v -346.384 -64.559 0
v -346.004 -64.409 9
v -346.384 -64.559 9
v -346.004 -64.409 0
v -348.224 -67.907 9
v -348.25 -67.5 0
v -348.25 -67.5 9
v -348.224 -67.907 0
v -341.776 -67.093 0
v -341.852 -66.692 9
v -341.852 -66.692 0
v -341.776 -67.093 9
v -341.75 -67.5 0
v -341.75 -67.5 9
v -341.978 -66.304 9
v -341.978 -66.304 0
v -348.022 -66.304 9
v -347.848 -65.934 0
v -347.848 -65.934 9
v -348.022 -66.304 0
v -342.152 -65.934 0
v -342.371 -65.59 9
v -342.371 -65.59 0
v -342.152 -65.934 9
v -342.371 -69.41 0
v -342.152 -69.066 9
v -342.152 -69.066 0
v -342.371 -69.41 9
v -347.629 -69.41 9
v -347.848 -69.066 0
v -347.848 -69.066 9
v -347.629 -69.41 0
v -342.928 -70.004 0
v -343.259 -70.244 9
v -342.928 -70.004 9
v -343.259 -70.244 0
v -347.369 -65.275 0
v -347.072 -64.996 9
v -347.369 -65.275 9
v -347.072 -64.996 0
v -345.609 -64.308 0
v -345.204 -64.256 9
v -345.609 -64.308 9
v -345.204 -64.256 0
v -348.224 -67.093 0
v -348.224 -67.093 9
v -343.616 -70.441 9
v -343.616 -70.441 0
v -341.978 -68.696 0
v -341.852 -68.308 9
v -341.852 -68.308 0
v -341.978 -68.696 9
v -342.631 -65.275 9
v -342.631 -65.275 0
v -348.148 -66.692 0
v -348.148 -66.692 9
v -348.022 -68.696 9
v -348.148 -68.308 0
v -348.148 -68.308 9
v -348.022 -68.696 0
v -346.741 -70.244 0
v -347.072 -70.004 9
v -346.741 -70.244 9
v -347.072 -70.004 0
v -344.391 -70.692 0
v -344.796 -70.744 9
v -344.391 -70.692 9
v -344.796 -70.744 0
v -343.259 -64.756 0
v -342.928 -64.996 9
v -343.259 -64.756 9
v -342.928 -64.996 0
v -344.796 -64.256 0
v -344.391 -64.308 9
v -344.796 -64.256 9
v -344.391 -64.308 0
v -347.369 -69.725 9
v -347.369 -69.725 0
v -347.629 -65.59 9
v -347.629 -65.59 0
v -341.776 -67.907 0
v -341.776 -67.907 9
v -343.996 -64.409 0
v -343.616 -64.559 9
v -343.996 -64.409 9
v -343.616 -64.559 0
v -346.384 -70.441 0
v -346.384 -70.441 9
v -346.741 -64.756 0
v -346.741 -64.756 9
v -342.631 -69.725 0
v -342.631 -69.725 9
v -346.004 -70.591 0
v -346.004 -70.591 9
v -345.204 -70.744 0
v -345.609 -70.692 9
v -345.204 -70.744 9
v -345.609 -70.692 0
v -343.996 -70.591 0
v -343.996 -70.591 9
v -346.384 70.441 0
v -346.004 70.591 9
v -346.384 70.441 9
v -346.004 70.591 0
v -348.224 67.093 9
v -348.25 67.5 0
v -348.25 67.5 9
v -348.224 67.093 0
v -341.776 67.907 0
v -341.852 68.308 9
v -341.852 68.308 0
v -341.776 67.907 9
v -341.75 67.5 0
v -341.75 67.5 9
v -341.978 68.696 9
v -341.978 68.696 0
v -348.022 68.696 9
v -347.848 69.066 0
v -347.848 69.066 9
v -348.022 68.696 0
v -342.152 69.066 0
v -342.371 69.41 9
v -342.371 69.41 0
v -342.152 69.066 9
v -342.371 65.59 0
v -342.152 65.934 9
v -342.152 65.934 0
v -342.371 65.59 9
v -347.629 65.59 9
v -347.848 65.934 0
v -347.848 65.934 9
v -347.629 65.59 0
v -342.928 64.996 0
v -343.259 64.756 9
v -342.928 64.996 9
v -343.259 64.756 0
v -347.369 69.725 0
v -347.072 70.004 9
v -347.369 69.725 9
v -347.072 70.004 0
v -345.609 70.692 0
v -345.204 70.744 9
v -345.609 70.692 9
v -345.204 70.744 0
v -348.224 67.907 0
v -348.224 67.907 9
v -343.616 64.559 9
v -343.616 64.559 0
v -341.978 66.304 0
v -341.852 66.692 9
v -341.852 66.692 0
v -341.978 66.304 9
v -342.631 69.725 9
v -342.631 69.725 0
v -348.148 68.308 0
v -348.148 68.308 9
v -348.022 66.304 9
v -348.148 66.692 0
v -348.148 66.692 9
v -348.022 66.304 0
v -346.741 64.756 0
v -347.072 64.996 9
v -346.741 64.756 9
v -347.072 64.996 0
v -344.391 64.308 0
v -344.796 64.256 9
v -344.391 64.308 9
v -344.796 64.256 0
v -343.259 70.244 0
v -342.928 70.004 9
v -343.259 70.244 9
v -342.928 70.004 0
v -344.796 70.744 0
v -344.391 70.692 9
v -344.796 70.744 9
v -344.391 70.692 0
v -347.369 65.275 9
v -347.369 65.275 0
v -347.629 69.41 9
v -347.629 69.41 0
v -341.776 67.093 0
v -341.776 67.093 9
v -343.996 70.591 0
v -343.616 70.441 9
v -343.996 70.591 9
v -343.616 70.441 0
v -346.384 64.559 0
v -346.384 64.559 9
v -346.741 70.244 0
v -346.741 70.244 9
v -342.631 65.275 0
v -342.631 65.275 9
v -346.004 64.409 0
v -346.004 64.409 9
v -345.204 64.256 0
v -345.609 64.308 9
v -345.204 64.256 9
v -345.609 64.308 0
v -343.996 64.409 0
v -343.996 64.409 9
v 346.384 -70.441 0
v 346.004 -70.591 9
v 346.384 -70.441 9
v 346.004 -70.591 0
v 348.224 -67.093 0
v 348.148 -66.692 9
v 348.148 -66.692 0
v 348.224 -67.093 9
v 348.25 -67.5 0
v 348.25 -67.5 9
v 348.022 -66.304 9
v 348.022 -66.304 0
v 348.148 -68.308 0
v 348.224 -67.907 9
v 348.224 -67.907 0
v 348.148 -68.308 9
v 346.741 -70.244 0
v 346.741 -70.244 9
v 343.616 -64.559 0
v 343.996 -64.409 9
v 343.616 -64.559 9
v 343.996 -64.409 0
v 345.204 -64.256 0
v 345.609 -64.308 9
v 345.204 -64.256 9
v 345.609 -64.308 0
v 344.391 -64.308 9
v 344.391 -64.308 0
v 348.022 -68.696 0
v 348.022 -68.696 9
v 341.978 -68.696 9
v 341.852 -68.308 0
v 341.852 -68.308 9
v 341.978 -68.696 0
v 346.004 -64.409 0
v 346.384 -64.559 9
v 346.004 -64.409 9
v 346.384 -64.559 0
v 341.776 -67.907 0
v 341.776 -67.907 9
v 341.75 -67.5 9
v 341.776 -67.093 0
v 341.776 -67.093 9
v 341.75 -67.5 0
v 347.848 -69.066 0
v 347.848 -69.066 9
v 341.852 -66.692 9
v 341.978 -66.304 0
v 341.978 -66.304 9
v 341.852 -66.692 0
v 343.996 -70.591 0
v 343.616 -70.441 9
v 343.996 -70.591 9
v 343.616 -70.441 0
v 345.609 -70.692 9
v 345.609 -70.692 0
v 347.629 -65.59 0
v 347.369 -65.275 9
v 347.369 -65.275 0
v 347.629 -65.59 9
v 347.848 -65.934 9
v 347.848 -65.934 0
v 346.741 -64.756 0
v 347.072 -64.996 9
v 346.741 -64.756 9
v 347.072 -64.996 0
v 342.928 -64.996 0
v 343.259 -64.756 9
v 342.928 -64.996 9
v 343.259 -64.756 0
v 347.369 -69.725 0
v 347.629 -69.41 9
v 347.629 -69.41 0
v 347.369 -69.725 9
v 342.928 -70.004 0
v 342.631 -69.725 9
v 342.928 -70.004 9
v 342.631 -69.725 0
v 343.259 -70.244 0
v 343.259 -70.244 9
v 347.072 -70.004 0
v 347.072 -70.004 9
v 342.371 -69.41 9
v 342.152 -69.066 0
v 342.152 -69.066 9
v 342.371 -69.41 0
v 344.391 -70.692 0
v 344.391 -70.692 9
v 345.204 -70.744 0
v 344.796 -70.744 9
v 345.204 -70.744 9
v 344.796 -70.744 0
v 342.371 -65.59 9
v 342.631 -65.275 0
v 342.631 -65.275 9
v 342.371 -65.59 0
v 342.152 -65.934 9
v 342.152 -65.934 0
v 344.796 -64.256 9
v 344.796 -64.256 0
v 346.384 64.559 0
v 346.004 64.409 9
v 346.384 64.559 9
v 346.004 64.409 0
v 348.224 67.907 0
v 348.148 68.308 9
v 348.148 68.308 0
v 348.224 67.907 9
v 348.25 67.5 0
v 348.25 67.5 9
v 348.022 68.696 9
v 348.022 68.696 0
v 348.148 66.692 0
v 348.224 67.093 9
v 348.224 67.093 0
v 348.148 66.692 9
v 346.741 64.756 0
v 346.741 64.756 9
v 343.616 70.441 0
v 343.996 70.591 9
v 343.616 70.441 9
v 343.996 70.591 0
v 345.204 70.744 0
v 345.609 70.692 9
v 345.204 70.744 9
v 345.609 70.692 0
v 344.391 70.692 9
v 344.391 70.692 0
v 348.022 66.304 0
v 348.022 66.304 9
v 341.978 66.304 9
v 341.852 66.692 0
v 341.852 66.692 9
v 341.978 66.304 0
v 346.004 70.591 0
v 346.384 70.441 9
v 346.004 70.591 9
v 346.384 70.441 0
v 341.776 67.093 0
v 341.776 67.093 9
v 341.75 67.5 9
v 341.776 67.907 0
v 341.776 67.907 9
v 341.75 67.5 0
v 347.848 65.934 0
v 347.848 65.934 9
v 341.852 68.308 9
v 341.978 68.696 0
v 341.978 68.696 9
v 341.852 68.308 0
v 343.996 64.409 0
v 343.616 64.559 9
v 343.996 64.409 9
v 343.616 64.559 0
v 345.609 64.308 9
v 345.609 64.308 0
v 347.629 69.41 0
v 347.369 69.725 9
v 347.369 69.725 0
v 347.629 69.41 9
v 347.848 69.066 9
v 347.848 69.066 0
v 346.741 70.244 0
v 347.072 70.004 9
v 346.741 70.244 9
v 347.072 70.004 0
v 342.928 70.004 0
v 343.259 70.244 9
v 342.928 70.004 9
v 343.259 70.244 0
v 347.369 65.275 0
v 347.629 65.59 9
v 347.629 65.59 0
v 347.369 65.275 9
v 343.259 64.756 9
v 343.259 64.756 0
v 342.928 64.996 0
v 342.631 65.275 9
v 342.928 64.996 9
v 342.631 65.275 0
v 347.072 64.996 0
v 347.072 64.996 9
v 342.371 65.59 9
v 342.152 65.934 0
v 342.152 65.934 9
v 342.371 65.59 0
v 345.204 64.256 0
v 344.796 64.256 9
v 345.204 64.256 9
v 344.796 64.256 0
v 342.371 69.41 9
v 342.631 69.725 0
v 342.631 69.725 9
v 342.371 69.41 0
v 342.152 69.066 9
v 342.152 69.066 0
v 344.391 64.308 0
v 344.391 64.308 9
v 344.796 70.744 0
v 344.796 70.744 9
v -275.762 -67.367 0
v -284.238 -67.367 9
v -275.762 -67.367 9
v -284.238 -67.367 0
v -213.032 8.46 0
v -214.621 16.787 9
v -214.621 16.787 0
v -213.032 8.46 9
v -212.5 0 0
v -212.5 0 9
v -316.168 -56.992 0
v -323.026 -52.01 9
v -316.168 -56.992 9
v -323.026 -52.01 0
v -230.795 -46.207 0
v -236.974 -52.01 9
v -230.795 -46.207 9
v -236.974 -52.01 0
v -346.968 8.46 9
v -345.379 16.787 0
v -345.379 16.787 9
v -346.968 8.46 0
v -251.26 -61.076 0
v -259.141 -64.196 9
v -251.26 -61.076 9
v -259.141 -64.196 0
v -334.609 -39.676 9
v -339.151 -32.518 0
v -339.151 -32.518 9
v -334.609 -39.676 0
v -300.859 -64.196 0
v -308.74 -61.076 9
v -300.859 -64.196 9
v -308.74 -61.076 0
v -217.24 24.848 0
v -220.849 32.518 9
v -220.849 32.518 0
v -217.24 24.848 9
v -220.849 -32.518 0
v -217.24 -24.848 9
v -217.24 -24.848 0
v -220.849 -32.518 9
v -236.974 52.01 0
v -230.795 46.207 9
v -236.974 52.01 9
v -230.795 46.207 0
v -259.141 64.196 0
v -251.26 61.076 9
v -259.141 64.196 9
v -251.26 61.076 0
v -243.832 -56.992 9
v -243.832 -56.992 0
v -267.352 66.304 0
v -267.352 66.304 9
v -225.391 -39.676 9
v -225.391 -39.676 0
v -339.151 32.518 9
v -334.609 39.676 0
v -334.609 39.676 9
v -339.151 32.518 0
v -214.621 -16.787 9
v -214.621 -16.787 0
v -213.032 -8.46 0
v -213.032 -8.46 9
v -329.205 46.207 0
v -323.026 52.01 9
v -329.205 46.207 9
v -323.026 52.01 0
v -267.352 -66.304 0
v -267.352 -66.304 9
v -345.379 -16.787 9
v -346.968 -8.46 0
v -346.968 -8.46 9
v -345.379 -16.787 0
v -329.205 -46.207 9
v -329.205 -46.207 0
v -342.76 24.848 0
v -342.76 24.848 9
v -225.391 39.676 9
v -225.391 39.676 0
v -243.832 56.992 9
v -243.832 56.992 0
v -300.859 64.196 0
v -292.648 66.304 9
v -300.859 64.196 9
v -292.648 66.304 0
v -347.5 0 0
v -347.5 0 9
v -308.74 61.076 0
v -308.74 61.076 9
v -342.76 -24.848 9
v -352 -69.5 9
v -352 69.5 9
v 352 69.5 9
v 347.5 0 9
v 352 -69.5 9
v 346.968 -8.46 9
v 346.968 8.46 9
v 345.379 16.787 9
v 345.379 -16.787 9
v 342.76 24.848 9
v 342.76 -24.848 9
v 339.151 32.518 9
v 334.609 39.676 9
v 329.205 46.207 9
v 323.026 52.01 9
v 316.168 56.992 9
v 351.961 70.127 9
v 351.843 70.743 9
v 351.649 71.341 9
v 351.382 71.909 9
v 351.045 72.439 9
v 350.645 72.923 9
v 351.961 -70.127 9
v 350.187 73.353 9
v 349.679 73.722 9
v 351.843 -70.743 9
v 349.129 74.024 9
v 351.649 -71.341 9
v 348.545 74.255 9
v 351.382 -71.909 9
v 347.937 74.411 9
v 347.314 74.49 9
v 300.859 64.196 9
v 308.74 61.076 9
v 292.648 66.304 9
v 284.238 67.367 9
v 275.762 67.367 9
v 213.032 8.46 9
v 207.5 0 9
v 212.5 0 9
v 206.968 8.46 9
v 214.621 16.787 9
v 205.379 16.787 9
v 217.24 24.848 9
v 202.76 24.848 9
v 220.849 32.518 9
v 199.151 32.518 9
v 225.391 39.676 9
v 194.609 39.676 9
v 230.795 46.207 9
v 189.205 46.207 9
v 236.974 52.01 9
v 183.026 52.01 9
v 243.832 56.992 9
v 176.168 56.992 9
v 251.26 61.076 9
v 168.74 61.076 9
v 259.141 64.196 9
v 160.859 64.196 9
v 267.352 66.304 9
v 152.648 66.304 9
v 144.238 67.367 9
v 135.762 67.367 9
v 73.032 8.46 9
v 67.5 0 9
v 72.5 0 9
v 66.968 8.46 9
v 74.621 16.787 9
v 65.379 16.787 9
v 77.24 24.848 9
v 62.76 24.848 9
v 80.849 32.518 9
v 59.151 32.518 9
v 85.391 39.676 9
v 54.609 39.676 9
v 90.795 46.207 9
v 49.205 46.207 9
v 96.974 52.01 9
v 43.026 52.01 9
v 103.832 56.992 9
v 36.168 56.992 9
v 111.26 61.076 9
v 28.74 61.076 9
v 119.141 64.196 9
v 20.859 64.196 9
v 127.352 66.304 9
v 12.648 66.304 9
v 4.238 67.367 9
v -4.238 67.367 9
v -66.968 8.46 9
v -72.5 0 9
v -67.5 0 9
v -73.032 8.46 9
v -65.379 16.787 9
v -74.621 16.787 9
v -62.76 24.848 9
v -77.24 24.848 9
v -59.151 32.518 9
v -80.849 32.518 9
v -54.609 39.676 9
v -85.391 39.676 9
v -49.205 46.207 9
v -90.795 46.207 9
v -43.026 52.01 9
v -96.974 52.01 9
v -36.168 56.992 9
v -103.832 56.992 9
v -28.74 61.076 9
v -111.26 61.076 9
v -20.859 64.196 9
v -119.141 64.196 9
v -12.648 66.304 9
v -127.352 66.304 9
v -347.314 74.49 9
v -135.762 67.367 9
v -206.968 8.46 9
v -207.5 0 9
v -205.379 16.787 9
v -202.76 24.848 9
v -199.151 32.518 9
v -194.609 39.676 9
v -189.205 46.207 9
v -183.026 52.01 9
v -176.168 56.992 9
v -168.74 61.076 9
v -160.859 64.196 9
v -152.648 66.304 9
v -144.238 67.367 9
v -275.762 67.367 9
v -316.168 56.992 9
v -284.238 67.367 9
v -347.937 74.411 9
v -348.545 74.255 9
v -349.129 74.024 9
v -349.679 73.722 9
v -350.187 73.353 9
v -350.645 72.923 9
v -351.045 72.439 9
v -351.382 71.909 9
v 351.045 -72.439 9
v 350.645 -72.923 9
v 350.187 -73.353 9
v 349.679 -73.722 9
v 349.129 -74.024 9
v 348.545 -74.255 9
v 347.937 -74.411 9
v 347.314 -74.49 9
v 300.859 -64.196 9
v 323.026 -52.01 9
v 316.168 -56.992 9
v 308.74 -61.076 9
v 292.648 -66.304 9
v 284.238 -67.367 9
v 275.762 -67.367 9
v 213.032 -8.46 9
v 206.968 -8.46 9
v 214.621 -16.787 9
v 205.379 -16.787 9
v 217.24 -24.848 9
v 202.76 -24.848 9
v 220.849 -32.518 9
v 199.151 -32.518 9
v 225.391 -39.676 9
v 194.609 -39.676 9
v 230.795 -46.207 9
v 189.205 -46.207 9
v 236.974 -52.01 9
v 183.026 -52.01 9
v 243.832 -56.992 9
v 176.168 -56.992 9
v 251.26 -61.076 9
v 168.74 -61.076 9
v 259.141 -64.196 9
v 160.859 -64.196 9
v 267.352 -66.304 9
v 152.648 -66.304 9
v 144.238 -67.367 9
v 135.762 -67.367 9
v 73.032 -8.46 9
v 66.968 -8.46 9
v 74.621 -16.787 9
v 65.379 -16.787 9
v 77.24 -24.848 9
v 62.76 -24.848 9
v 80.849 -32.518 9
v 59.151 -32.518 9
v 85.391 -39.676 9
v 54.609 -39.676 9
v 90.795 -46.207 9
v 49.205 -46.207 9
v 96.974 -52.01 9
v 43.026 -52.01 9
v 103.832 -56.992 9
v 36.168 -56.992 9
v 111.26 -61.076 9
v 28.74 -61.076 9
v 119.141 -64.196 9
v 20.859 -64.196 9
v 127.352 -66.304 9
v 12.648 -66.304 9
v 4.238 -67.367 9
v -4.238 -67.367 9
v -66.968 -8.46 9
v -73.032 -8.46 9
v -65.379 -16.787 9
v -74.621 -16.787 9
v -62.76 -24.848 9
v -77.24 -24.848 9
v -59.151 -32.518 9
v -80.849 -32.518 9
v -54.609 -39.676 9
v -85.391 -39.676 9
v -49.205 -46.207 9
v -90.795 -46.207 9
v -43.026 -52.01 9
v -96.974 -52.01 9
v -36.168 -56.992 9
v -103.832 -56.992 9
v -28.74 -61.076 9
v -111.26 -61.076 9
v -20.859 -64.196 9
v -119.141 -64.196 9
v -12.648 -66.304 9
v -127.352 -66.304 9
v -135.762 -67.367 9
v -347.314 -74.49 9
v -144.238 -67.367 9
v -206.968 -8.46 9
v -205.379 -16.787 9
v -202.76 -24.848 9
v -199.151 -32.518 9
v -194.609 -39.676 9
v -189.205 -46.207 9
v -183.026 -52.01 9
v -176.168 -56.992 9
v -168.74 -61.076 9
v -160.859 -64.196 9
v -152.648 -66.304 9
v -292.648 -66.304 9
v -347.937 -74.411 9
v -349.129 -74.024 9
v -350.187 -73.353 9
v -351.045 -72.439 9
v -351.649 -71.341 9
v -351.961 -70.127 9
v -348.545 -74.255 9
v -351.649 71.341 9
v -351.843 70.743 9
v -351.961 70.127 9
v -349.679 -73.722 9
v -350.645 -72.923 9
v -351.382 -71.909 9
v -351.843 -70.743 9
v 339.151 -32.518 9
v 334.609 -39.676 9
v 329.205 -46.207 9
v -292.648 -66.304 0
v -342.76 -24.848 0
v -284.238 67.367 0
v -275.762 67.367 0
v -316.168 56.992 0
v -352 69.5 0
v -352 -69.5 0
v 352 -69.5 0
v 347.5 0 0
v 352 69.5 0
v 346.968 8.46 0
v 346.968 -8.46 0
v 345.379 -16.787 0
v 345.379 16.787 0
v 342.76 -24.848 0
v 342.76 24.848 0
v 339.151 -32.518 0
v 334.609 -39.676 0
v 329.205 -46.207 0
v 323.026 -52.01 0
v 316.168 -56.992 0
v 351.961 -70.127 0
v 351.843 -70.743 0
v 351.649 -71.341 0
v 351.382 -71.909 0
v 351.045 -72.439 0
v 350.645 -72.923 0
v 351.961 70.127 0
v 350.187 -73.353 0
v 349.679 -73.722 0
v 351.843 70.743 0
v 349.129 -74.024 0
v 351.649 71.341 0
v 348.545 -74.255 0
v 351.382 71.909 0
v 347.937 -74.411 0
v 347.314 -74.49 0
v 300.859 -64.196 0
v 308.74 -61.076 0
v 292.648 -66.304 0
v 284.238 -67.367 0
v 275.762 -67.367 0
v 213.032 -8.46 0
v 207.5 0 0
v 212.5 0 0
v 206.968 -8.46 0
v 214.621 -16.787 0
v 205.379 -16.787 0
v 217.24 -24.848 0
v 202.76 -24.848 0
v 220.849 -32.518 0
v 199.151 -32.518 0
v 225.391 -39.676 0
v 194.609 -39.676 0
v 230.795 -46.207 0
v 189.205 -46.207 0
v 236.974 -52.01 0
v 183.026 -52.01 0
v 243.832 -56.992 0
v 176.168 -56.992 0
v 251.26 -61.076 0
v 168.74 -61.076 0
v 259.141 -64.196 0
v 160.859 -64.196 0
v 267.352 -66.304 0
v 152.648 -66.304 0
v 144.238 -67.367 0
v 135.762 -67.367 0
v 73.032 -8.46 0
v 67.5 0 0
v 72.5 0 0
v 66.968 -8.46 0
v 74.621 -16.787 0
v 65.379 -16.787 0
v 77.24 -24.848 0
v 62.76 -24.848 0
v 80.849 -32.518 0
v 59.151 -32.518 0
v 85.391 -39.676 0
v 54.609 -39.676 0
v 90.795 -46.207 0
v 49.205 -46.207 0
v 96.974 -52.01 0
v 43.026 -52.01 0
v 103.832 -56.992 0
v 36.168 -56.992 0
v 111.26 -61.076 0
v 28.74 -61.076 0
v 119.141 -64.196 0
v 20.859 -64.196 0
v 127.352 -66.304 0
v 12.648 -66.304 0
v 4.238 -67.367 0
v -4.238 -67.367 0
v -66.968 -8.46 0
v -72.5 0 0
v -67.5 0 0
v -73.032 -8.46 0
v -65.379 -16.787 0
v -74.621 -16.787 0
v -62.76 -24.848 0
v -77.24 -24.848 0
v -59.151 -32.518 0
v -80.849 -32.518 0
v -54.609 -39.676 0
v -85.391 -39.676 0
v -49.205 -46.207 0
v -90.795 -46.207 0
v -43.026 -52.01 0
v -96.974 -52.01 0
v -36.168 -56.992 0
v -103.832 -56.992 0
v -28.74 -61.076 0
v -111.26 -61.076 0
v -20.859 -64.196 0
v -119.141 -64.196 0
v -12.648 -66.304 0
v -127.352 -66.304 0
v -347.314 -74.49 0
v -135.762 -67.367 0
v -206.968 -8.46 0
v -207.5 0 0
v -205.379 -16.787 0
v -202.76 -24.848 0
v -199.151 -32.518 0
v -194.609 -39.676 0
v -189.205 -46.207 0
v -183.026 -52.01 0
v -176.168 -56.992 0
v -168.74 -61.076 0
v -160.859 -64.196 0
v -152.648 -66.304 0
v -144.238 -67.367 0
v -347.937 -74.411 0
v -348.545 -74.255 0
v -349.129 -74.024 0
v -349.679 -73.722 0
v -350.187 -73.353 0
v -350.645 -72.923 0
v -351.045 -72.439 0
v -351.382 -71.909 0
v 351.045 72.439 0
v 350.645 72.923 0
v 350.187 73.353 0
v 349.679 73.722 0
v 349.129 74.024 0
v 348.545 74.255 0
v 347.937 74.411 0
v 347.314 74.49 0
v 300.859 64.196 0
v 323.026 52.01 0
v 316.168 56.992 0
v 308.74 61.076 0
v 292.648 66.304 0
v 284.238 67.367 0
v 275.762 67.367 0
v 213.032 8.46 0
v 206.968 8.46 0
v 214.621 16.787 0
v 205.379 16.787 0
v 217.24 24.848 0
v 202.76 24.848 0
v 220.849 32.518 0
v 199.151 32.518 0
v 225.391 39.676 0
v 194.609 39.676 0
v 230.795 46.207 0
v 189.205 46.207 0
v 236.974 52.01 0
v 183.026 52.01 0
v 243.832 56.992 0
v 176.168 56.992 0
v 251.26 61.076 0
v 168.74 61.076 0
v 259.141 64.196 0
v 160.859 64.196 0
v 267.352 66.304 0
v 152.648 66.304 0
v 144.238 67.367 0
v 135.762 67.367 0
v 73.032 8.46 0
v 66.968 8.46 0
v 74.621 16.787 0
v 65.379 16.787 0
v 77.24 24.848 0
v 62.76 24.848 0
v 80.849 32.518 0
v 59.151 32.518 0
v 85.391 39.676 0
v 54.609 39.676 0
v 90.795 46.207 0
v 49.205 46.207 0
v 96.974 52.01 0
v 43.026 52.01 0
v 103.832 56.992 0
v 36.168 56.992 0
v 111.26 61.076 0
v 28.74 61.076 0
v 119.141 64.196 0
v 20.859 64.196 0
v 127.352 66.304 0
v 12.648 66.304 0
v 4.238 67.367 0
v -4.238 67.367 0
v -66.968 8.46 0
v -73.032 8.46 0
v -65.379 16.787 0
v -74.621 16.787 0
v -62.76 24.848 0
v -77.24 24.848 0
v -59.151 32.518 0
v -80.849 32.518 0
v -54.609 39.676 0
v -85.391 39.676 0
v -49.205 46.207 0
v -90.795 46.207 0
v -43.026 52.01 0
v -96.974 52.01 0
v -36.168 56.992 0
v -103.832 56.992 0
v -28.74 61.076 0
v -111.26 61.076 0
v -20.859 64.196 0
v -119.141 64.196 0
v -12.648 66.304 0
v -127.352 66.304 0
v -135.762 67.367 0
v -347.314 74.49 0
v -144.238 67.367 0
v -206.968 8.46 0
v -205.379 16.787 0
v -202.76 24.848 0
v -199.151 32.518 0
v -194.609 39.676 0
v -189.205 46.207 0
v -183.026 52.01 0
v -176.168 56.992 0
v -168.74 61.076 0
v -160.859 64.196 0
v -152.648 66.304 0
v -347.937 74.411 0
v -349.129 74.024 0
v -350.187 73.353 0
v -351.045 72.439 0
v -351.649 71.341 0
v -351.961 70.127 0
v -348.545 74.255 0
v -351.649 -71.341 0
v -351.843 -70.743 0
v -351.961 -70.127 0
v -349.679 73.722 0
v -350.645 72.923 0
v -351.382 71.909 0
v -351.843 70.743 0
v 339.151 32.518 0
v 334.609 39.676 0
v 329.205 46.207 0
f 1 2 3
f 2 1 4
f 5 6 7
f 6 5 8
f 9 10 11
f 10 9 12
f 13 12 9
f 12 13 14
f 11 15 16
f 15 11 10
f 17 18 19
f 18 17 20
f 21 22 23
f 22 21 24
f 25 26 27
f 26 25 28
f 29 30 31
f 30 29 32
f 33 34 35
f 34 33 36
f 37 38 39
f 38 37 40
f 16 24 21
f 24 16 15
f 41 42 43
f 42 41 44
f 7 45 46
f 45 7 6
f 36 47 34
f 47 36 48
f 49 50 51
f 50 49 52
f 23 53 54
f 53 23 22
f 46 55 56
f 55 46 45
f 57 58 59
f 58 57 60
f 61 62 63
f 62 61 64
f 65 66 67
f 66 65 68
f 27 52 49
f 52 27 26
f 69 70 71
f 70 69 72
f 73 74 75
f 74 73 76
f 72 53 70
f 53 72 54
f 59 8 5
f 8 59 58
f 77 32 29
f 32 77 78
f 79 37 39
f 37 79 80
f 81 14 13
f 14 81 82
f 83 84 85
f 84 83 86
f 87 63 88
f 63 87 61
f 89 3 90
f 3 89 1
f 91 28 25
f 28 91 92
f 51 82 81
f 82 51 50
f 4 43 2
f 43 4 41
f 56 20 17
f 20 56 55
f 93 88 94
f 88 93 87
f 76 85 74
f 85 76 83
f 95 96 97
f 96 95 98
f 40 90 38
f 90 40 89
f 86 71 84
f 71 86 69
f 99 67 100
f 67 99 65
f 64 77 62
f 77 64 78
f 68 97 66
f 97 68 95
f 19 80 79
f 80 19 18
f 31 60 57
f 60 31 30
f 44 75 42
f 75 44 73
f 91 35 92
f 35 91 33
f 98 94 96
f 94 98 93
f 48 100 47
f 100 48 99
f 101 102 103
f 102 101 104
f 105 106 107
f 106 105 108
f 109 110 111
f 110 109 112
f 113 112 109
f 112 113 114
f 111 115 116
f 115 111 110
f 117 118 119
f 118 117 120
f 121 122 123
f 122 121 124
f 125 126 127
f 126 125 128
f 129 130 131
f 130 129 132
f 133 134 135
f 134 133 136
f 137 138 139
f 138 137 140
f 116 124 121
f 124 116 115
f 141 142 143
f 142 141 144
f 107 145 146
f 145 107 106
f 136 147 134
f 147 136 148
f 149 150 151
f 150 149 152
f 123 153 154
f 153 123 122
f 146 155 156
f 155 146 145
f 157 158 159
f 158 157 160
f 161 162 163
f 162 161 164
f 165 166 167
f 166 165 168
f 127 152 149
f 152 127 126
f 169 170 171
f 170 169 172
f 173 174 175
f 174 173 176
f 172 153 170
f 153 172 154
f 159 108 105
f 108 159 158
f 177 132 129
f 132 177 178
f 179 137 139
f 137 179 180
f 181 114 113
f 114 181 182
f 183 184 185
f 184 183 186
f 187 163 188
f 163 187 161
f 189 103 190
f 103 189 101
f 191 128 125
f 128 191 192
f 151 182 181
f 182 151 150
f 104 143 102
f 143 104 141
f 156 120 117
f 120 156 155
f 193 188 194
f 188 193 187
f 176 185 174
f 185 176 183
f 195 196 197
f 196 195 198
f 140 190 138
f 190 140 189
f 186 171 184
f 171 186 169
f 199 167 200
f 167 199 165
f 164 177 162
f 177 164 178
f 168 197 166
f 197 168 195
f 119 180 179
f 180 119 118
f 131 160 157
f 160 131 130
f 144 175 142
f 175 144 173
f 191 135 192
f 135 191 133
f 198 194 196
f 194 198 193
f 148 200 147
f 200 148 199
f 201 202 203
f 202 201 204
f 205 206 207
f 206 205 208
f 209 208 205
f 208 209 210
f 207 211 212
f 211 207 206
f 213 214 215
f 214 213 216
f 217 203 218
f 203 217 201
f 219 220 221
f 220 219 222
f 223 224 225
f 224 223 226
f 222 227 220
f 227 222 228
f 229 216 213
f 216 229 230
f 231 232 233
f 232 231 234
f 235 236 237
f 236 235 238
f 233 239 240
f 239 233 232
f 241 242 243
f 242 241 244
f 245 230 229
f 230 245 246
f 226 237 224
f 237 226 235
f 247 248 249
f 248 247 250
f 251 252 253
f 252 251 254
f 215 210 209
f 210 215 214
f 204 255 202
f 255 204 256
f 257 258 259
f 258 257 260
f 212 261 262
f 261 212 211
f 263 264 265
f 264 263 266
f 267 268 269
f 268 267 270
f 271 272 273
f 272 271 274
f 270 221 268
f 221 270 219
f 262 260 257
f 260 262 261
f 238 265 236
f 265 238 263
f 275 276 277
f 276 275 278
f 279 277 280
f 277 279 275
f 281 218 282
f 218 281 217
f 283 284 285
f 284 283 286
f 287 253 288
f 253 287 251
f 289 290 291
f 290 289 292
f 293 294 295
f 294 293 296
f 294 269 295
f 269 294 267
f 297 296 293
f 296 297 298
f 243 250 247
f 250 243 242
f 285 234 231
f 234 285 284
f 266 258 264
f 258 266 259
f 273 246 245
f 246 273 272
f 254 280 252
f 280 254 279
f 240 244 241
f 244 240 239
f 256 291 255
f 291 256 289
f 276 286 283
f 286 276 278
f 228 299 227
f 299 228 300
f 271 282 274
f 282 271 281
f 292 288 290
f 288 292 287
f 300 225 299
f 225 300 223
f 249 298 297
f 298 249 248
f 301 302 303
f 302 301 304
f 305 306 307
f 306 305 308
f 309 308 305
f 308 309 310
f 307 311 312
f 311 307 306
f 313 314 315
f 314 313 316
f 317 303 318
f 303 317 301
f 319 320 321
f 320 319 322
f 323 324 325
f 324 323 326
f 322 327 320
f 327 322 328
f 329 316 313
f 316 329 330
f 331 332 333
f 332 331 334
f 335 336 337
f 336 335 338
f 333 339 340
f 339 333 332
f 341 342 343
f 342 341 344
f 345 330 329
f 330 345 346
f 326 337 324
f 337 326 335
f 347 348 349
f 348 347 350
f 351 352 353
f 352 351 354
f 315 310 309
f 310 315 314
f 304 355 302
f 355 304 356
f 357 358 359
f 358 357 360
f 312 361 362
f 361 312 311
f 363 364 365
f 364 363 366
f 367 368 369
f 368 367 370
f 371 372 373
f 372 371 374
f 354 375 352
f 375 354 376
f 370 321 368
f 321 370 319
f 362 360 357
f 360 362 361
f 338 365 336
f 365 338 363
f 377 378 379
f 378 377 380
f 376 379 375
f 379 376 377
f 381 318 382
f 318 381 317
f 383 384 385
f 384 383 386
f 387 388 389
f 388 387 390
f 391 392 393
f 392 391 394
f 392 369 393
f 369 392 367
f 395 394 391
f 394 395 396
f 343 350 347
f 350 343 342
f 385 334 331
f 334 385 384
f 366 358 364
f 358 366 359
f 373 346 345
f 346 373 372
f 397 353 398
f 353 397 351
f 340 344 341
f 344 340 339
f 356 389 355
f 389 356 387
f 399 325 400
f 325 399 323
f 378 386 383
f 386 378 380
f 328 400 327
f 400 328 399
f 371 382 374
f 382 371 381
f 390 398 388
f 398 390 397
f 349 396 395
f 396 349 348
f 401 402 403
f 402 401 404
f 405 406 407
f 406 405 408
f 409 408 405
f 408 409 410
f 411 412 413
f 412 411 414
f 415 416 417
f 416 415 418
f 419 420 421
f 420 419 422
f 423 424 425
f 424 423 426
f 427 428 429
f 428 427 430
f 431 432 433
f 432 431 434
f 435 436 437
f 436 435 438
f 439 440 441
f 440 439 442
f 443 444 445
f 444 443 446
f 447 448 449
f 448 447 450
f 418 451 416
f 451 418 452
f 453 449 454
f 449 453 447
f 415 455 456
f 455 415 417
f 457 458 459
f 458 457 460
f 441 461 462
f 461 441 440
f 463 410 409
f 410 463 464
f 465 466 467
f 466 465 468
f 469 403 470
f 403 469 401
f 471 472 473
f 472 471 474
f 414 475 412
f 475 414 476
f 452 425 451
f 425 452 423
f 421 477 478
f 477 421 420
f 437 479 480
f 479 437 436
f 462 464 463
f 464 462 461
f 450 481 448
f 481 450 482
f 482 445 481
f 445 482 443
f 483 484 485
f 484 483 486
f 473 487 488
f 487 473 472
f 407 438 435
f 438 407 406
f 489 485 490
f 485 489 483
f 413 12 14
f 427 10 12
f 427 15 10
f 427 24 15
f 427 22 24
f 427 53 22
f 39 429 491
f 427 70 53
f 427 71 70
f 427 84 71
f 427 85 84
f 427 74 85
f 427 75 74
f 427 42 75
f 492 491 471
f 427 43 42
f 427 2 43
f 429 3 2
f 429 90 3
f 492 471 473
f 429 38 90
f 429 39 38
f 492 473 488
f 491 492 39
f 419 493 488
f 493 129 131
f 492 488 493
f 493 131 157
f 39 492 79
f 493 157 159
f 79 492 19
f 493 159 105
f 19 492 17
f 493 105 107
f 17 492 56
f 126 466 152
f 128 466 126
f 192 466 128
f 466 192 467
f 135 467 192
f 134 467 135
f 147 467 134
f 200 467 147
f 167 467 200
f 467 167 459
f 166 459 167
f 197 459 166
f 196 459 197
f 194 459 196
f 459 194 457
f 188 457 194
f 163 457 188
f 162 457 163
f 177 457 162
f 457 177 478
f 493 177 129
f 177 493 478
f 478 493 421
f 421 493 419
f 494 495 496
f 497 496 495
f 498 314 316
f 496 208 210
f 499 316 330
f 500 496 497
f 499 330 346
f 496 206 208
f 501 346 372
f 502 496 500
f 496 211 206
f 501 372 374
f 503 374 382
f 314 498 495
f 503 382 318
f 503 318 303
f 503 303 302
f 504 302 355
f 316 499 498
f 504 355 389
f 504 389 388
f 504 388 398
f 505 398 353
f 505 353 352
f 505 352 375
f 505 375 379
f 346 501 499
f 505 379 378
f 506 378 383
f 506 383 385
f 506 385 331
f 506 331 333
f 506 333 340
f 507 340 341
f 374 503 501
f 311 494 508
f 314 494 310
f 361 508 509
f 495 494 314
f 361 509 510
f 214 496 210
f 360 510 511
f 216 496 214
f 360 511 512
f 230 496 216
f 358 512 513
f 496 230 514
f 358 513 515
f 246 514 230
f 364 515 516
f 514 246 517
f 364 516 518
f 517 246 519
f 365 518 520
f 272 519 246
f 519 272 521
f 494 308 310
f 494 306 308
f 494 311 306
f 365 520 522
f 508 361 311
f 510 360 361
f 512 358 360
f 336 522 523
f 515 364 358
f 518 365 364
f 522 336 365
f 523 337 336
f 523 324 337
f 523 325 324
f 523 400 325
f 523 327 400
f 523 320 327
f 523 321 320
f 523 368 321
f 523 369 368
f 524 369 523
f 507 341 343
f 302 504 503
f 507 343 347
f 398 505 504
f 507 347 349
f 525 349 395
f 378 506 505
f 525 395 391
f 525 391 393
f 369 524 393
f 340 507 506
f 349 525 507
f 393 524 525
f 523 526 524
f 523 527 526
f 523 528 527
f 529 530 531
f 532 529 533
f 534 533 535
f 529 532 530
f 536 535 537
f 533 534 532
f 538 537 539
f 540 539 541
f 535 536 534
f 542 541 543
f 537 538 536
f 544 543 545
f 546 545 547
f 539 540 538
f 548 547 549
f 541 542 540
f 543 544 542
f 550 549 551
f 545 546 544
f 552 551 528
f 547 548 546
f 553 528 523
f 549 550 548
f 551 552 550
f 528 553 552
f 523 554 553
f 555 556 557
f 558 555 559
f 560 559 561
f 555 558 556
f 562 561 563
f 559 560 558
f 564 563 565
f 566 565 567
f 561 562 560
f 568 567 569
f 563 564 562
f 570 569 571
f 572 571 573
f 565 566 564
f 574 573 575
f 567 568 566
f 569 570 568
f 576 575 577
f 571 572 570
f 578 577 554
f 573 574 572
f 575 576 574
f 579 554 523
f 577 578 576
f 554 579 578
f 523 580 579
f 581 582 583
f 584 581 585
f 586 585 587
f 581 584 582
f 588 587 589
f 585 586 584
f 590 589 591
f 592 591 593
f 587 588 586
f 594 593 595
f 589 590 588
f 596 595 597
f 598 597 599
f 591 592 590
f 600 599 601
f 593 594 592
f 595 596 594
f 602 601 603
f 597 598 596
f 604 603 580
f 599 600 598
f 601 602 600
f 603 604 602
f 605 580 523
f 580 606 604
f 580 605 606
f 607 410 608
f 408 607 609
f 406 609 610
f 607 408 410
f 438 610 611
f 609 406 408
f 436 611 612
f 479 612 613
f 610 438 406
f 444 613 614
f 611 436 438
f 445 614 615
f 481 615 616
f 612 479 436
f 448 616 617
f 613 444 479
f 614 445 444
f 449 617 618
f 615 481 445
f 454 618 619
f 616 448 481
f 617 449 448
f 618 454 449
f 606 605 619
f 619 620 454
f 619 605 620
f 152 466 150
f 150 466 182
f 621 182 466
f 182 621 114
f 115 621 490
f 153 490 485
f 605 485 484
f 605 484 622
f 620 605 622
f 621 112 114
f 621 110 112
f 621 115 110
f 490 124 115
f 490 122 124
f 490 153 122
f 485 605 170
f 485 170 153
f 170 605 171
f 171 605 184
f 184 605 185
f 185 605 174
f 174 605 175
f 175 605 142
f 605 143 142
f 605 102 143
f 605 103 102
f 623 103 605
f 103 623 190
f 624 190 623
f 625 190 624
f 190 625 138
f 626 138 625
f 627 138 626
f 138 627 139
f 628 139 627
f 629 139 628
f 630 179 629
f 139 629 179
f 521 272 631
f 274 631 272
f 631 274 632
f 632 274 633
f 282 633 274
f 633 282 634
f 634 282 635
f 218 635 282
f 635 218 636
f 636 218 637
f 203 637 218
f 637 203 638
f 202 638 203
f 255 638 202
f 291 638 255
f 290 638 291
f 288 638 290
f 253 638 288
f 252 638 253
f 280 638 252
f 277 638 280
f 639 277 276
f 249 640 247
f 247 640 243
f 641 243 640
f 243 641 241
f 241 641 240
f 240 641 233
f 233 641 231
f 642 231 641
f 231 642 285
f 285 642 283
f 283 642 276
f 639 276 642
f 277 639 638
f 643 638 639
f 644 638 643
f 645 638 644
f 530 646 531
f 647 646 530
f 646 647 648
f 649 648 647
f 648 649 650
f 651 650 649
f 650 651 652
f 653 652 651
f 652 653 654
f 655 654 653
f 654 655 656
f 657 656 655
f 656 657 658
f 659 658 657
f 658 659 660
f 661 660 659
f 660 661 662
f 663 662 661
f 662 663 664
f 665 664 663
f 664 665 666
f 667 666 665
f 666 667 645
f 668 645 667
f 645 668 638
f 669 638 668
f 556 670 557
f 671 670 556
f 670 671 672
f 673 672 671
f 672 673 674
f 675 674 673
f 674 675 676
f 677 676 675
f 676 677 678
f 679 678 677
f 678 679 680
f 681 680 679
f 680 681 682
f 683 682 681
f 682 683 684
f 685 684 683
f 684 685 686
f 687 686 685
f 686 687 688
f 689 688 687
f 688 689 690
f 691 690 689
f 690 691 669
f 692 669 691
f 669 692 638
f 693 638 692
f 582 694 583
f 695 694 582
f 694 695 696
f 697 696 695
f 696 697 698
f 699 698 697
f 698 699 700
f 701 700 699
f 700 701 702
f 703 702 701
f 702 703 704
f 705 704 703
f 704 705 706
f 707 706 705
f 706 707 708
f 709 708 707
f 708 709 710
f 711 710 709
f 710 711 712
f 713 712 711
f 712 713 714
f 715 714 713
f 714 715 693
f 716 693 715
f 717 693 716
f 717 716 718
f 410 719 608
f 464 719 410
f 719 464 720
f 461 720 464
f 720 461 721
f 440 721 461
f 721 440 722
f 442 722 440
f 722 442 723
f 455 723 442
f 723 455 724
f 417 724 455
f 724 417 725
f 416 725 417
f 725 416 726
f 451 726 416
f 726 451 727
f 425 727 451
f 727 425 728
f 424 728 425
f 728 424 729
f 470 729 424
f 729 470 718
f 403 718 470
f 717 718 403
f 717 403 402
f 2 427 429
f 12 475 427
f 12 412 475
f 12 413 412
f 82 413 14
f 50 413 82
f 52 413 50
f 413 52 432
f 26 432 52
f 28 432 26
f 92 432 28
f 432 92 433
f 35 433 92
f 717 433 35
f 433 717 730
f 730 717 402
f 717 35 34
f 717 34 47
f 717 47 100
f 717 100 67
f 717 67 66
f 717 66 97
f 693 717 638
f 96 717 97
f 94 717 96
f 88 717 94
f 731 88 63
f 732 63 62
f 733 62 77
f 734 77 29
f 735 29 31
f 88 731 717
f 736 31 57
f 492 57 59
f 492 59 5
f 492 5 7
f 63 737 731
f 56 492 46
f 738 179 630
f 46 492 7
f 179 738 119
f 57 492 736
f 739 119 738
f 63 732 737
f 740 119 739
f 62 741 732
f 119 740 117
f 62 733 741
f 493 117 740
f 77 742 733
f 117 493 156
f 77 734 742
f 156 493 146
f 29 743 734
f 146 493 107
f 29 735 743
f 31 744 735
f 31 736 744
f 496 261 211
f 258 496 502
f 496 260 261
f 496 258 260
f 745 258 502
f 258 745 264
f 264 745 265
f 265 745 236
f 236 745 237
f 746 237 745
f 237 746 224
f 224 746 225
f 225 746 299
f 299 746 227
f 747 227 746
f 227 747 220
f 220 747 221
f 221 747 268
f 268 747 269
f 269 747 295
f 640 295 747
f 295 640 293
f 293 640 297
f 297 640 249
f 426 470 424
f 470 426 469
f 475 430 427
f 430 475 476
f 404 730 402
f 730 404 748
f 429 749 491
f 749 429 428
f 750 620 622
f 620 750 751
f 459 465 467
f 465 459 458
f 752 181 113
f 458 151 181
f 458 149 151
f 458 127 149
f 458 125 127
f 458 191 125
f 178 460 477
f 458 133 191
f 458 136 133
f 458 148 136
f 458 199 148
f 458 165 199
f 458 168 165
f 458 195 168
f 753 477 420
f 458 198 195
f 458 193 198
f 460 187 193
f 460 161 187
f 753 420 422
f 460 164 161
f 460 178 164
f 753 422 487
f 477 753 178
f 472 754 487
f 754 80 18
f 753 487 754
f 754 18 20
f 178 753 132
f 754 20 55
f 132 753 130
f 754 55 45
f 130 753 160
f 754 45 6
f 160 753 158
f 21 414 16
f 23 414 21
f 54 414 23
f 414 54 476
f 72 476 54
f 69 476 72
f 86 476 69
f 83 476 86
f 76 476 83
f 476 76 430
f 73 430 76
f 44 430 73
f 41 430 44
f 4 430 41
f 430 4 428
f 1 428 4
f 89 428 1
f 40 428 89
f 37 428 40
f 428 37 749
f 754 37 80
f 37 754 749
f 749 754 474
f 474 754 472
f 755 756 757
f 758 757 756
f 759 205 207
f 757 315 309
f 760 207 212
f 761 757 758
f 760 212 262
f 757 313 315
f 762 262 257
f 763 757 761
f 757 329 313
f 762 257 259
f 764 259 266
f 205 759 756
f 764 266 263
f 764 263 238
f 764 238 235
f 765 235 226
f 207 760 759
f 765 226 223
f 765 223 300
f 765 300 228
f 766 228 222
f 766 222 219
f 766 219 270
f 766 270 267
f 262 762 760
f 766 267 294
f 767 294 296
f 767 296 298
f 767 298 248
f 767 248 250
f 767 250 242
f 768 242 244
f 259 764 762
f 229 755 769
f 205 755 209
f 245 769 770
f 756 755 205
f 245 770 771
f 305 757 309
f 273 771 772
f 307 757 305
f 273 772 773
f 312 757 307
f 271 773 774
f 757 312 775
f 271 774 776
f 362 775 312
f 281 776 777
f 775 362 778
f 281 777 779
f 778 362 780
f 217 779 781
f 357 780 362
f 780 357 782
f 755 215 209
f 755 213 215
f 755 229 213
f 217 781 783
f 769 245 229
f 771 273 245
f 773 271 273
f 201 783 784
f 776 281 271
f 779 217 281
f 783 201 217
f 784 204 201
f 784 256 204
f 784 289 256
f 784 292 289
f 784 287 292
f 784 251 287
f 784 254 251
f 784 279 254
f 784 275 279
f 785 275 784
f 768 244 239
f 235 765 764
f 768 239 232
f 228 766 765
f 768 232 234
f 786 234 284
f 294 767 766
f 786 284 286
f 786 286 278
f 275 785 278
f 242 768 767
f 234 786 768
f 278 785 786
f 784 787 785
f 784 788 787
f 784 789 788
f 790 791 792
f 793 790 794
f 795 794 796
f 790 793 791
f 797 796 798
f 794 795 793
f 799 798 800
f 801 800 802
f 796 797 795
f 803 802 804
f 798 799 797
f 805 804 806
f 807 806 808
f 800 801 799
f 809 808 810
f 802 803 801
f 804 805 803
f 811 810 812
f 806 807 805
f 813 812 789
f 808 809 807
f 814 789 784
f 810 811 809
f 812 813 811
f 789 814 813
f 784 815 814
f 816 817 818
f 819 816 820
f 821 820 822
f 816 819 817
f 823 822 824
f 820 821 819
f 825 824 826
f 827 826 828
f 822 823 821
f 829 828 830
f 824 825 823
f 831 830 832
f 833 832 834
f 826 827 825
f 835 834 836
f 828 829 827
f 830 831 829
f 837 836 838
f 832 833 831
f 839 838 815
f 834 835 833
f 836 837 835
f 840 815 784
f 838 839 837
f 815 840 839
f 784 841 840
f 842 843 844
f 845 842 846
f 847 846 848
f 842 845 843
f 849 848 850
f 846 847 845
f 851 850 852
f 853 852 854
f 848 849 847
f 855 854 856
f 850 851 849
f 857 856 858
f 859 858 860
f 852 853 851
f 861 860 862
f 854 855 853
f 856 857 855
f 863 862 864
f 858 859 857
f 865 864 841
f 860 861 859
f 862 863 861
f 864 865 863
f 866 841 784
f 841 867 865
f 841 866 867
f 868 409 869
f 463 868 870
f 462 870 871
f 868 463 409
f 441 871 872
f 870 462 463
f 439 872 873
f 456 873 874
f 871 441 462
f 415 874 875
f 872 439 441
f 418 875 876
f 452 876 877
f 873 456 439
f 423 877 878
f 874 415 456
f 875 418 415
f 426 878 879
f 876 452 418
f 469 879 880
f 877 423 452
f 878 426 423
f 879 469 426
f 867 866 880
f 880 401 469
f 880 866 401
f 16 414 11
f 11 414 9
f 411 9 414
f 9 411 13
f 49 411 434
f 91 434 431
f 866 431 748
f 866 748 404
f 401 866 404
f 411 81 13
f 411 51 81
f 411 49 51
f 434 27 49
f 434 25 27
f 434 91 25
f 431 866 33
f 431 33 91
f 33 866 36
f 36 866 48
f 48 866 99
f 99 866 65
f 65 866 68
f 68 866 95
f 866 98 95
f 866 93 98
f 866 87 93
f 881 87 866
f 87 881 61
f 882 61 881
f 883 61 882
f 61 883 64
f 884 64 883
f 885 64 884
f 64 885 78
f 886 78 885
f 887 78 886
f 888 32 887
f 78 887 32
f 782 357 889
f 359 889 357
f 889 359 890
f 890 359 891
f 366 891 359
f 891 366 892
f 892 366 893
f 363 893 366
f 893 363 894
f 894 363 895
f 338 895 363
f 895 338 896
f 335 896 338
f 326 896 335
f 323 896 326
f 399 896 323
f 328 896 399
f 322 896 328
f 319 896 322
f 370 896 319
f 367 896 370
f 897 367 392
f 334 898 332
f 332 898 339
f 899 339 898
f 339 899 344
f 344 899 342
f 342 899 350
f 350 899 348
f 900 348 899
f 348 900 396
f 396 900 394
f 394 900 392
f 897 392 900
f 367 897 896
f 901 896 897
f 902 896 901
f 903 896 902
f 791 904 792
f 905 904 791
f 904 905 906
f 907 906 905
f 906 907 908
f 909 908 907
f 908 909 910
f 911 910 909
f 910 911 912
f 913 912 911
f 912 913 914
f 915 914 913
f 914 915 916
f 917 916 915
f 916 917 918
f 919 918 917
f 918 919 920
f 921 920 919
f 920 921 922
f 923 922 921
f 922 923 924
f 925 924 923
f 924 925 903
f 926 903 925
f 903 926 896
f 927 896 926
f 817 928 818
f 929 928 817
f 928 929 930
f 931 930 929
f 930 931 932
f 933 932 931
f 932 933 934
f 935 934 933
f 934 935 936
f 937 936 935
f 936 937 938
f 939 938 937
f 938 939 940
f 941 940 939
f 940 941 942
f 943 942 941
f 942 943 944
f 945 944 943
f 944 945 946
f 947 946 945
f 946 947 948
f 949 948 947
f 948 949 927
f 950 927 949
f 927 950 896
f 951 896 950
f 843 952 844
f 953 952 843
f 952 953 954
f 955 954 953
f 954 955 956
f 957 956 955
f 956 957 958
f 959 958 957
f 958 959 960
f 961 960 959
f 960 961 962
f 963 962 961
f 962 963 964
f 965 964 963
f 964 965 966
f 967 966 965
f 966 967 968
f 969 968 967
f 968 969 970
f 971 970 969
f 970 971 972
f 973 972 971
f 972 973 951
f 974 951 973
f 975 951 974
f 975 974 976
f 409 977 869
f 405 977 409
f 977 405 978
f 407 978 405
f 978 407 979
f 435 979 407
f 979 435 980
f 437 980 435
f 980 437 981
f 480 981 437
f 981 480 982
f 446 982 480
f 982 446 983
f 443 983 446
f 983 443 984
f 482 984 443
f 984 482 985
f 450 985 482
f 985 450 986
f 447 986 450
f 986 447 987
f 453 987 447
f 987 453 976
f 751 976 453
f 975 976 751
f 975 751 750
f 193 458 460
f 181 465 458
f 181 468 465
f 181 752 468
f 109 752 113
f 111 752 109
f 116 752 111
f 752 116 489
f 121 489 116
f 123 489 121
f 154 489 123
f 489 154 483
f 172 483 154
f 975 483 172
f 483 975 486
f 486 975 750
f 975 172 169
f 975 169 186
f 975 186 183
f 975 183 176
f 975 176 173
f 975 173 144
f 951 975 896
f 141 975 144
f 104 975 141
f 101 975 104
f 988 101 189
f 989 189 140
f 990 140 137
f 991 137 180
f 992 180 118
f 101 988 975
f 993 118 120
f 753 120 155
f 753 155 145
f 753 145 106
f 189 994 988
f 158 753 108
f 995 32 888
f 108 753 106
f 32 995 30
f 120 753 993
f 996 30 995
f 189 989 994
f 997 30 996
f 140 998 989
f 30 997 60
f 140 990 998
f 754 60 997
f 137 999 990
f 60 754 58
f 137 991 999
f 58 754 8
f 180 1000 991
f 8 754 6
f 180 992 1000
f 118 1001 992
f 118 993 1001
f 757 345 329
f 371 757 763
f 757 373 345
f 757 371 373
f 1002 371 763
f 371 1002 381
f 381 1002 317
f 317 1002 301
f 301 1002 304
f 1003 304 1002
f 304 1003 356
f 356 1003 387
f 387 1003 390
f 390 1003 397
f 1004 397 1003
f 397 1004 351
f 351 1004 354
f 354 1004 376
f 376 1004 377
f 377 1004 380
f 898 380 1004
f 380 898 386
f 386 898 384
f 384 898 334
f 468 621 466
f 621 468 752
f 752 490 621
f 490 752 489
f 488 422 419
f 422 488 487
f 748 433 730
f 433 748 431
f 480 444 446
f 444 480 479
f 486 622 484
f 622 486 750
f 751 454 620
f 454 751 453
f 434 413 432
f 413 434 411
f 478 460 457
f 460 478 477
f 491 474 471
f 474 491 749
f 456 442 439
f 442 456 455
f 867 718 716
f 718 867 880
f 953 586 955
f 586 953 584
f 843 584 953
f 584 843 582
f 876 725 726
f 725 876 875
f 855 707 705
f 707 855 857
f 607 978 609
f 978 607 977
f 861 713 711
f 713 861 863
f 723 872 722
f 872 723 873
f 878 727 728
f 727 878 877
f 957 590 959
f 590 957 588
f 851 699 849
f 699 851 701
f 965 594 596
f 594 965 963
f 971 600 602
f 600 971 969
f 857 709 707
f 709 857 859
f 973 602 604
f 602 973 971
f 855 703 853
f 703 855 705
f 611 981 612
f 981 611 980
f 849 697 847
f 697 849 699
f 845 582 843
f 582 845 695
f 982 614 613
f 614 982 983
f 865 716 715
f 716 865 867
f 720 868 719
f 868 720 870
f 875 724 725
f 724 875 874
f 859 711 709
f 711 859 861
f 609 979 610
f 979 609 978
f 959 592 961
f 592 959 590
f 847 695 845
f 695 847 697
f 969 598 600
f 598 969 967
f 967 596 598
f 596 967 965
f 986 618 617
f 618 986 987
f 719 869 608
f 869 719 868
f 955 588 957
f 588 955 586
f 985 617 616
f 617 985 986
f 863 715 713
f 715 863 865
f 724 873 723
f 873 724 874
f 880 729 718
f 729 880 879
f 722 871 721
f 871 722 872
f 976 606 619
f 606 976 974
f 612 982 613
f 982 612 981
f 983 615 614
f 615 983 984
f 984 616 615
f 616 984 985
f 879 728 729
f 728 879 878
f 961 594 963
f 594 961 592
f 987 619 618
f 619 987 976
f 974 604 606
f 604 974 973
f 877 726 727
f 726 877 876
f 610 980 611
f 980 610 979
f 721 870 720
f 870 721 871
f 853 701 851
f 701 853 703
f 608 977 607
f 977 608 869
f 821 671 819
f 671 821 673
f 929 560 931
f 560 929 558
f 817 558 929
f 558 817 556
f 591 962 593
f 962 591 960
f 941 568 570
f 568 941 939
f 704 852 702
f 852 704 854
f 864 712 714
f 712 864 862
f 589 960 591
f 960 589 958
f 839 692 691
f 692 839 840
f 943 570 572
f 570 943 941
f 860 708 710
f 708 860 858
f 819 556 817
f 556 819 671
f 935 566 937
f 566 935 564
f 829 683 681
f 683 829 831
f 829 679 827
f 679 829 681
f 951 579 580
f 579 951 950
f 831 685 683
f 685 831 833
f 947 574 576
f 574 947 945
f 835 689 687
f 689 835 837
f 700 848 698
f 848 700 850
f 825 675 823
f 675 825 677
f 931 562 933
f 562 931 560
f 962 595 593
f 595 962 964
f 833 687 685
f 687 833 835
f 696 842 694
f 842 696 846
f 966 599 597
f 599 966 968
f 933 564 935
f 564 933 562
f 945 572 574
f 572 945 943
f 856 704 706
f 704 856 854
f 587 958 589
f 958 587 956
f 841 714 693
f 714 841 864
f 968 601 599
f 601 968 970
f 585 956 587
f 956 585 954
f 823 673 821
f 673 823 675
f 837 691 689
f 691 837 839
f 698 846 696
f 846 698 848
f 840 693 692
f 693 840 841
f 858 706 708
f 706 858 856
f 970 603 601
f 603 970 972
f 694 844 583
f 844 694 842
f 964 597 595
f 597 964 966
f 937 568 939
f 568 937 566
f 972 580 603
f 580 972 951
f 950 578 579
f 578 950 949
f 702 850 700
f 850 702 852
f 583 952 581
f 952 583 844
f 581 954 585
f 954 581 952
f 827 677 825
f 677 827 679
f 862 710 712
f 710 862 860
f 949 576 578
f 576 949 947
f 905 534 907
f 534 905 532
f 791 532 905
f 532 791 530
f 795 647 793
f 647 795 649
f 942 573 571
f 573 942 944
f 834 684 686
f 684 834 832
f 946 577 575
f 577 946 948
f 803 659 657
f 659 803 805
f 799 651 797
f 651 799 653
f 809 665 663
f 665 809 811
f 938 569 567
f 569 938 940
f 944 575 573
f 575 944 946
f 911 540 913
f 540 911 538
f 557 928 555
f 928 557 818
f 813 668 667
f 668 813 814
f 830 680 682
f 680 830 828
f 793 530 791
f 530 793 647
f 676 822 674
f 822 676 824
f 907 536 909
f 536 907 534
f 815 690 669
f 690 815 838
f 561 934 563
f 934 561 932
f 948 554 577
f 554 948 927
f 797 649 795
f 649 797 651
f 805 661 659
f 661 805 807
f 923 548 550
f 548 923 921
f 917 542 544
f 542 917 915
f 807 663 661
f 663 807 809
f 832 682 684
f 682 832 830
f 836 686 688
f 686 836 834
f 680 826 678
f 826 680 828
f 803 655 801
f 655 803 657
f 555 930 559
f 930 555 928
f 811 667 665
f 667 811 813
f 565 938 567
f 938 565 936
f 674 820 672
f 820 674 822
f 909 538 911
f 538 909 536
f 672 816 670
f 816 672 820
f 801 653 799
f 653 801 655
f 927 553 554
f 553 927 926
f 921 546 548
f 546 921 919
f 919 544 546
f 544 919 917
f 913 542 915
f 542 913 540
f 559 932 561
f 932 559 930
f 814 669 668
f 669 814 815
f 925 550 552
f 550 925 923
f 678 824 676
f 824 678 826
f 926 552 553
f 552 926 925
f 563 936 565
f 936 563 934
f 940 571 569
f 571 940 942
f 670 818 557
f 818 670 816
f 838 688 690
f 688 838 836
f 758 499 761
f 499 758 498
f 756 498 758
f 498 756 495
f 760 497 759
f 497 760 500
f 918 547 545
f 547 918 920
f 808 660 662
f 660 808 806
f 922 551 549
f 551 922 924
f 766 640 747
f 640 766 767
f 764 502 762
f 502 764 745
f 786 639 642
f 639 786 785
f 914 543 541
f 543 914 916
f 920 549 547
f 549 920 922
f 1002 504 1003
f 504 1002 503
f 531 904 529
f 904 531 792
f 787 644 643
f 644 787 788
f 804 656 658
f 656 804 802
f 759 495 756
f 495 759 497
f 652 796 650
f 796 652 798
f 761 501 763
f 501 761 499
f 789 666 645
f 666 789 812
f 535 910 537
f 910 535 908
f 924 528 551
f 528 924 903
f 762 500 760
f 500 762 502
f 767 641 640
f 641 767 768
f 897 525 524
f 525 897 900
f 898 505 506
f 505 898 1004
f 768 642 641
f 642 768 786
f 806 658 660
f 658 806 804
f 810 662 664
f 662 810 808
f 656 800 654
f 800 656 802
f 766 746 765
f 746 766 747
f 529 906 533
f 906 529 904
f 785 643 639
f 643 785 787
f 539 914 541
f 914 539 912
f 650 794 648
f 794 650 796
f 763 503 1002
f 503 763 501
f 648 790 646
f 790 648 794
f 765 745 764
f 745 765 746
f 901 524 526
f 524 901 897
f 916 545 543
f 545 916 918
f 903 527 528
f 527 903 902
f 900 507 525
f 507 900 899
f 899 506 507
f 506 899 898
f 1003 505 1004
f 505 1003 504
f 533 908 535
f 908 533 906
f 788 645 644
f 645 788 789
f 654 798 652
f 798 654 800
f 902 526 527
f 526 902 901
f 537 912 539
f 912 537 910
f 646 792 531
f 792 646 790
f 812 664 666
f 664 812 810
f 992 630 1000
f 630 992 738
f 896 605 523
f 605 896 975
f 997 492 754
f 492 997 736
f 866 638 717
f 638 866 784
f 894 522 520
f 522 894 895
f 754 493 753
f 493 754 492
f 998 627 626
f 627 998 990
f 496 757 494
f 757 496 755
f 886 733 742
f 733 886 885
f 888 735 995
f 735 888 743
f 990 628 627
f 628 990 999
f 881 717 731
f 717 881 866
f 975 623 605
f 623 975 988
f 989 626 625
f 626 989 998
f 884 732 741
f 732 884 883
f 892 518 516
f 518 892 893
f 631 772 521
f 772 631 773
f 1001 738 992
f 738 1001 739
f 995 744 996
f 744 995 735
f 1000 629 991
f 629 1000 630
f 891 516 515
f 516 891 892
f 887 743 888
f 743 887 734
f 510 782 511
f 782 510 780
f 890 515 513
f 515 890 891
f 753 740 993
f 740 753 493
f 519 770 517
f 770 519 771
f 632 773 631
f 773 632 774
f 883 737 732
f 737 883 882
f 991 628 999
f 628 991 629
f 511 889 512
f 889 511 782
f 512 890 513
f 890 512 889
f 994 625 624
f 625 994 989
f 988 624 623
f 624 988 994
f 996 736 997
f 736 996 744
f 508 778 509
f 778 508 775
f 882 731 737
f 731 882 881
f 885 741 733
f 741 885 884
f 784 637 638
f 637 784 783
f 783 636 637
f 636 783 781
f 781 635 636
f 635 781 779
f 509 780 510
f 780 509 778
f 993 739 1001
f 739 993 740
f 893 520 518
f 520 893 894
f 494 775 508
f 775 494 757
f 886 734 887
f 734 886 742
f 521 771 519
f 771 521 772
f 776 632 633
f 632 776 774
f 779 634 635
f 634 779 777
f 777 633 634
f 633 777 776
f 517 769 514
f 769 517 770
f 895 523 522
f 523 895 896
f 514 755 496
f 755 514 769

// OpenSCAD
$fn = 50;

difference() {
	union() {
		hull() {
			translate(v = [-347.0, 69.5, 0]) {
				cylinder(h = 9, r = 5);
			}
			translate(v = [347.0, 69.5, 0]) {
				cylinder(h = 9, r = 5);
			}
			translate(v = [-347.0, -69.5, 0]) {
				cylinder(h = 9, r = 5);
			}
			translate(v = [347.0, -69.5, 0]) {
				cylinder(h = 9, r = 5);
			}
		}
	}
	union() {
		translate(v = [-345.0, -67.5, -100.0]) {
			cylinder(h = 200, r = 3.25);
		}
		translate(v = [-345.0, 67.5, -100.0]) {
			cylinder(h = 200, r = 3.25);
		}
		translate(v = [345.0, -67.5, -100.0]) {
			cylinder(h = 200, r = 3.25);
		}
		translate(v = [345.0, 67.5, -100.0]) {
			cylinder(h = 200, r = 3.25);
		}
		translate(v = [-345.0, -67.5, -100.0]) {
			cylinder(h = 200, r = 1.8);
		}
		translate(v = [-345.0, 67.5, -100.0]) {
			cylinder(h = 200, r = 1.8);
		}
		translate(v = [345.0, -67.5, -100.0]) {
			cylinder(h = 200, r = 1.8);
		}
		translate(v = [345.0, 67.5, -100.0]) {
			cylinder(h = 200, r = 1.8);
		}
		translate(v = [-280.0, 0, 0.0]) {
			cylinder(h = 9, r = 67.5);
		}
		translate(v = [-140.0, 0, 0.0]) {
			cylinder(h = 9, r = 67.5);
		}
		cylinder(h = 9, r = 67.5);
		translate(v = [140.0, 0, 0.0]) {
			cylinder(h = 9, r = 67.5);
		}
		translate(v = [280.0, 0, 0.0]) {
			cylinder(h = 9, r = 67.5);
		}
	}
}
